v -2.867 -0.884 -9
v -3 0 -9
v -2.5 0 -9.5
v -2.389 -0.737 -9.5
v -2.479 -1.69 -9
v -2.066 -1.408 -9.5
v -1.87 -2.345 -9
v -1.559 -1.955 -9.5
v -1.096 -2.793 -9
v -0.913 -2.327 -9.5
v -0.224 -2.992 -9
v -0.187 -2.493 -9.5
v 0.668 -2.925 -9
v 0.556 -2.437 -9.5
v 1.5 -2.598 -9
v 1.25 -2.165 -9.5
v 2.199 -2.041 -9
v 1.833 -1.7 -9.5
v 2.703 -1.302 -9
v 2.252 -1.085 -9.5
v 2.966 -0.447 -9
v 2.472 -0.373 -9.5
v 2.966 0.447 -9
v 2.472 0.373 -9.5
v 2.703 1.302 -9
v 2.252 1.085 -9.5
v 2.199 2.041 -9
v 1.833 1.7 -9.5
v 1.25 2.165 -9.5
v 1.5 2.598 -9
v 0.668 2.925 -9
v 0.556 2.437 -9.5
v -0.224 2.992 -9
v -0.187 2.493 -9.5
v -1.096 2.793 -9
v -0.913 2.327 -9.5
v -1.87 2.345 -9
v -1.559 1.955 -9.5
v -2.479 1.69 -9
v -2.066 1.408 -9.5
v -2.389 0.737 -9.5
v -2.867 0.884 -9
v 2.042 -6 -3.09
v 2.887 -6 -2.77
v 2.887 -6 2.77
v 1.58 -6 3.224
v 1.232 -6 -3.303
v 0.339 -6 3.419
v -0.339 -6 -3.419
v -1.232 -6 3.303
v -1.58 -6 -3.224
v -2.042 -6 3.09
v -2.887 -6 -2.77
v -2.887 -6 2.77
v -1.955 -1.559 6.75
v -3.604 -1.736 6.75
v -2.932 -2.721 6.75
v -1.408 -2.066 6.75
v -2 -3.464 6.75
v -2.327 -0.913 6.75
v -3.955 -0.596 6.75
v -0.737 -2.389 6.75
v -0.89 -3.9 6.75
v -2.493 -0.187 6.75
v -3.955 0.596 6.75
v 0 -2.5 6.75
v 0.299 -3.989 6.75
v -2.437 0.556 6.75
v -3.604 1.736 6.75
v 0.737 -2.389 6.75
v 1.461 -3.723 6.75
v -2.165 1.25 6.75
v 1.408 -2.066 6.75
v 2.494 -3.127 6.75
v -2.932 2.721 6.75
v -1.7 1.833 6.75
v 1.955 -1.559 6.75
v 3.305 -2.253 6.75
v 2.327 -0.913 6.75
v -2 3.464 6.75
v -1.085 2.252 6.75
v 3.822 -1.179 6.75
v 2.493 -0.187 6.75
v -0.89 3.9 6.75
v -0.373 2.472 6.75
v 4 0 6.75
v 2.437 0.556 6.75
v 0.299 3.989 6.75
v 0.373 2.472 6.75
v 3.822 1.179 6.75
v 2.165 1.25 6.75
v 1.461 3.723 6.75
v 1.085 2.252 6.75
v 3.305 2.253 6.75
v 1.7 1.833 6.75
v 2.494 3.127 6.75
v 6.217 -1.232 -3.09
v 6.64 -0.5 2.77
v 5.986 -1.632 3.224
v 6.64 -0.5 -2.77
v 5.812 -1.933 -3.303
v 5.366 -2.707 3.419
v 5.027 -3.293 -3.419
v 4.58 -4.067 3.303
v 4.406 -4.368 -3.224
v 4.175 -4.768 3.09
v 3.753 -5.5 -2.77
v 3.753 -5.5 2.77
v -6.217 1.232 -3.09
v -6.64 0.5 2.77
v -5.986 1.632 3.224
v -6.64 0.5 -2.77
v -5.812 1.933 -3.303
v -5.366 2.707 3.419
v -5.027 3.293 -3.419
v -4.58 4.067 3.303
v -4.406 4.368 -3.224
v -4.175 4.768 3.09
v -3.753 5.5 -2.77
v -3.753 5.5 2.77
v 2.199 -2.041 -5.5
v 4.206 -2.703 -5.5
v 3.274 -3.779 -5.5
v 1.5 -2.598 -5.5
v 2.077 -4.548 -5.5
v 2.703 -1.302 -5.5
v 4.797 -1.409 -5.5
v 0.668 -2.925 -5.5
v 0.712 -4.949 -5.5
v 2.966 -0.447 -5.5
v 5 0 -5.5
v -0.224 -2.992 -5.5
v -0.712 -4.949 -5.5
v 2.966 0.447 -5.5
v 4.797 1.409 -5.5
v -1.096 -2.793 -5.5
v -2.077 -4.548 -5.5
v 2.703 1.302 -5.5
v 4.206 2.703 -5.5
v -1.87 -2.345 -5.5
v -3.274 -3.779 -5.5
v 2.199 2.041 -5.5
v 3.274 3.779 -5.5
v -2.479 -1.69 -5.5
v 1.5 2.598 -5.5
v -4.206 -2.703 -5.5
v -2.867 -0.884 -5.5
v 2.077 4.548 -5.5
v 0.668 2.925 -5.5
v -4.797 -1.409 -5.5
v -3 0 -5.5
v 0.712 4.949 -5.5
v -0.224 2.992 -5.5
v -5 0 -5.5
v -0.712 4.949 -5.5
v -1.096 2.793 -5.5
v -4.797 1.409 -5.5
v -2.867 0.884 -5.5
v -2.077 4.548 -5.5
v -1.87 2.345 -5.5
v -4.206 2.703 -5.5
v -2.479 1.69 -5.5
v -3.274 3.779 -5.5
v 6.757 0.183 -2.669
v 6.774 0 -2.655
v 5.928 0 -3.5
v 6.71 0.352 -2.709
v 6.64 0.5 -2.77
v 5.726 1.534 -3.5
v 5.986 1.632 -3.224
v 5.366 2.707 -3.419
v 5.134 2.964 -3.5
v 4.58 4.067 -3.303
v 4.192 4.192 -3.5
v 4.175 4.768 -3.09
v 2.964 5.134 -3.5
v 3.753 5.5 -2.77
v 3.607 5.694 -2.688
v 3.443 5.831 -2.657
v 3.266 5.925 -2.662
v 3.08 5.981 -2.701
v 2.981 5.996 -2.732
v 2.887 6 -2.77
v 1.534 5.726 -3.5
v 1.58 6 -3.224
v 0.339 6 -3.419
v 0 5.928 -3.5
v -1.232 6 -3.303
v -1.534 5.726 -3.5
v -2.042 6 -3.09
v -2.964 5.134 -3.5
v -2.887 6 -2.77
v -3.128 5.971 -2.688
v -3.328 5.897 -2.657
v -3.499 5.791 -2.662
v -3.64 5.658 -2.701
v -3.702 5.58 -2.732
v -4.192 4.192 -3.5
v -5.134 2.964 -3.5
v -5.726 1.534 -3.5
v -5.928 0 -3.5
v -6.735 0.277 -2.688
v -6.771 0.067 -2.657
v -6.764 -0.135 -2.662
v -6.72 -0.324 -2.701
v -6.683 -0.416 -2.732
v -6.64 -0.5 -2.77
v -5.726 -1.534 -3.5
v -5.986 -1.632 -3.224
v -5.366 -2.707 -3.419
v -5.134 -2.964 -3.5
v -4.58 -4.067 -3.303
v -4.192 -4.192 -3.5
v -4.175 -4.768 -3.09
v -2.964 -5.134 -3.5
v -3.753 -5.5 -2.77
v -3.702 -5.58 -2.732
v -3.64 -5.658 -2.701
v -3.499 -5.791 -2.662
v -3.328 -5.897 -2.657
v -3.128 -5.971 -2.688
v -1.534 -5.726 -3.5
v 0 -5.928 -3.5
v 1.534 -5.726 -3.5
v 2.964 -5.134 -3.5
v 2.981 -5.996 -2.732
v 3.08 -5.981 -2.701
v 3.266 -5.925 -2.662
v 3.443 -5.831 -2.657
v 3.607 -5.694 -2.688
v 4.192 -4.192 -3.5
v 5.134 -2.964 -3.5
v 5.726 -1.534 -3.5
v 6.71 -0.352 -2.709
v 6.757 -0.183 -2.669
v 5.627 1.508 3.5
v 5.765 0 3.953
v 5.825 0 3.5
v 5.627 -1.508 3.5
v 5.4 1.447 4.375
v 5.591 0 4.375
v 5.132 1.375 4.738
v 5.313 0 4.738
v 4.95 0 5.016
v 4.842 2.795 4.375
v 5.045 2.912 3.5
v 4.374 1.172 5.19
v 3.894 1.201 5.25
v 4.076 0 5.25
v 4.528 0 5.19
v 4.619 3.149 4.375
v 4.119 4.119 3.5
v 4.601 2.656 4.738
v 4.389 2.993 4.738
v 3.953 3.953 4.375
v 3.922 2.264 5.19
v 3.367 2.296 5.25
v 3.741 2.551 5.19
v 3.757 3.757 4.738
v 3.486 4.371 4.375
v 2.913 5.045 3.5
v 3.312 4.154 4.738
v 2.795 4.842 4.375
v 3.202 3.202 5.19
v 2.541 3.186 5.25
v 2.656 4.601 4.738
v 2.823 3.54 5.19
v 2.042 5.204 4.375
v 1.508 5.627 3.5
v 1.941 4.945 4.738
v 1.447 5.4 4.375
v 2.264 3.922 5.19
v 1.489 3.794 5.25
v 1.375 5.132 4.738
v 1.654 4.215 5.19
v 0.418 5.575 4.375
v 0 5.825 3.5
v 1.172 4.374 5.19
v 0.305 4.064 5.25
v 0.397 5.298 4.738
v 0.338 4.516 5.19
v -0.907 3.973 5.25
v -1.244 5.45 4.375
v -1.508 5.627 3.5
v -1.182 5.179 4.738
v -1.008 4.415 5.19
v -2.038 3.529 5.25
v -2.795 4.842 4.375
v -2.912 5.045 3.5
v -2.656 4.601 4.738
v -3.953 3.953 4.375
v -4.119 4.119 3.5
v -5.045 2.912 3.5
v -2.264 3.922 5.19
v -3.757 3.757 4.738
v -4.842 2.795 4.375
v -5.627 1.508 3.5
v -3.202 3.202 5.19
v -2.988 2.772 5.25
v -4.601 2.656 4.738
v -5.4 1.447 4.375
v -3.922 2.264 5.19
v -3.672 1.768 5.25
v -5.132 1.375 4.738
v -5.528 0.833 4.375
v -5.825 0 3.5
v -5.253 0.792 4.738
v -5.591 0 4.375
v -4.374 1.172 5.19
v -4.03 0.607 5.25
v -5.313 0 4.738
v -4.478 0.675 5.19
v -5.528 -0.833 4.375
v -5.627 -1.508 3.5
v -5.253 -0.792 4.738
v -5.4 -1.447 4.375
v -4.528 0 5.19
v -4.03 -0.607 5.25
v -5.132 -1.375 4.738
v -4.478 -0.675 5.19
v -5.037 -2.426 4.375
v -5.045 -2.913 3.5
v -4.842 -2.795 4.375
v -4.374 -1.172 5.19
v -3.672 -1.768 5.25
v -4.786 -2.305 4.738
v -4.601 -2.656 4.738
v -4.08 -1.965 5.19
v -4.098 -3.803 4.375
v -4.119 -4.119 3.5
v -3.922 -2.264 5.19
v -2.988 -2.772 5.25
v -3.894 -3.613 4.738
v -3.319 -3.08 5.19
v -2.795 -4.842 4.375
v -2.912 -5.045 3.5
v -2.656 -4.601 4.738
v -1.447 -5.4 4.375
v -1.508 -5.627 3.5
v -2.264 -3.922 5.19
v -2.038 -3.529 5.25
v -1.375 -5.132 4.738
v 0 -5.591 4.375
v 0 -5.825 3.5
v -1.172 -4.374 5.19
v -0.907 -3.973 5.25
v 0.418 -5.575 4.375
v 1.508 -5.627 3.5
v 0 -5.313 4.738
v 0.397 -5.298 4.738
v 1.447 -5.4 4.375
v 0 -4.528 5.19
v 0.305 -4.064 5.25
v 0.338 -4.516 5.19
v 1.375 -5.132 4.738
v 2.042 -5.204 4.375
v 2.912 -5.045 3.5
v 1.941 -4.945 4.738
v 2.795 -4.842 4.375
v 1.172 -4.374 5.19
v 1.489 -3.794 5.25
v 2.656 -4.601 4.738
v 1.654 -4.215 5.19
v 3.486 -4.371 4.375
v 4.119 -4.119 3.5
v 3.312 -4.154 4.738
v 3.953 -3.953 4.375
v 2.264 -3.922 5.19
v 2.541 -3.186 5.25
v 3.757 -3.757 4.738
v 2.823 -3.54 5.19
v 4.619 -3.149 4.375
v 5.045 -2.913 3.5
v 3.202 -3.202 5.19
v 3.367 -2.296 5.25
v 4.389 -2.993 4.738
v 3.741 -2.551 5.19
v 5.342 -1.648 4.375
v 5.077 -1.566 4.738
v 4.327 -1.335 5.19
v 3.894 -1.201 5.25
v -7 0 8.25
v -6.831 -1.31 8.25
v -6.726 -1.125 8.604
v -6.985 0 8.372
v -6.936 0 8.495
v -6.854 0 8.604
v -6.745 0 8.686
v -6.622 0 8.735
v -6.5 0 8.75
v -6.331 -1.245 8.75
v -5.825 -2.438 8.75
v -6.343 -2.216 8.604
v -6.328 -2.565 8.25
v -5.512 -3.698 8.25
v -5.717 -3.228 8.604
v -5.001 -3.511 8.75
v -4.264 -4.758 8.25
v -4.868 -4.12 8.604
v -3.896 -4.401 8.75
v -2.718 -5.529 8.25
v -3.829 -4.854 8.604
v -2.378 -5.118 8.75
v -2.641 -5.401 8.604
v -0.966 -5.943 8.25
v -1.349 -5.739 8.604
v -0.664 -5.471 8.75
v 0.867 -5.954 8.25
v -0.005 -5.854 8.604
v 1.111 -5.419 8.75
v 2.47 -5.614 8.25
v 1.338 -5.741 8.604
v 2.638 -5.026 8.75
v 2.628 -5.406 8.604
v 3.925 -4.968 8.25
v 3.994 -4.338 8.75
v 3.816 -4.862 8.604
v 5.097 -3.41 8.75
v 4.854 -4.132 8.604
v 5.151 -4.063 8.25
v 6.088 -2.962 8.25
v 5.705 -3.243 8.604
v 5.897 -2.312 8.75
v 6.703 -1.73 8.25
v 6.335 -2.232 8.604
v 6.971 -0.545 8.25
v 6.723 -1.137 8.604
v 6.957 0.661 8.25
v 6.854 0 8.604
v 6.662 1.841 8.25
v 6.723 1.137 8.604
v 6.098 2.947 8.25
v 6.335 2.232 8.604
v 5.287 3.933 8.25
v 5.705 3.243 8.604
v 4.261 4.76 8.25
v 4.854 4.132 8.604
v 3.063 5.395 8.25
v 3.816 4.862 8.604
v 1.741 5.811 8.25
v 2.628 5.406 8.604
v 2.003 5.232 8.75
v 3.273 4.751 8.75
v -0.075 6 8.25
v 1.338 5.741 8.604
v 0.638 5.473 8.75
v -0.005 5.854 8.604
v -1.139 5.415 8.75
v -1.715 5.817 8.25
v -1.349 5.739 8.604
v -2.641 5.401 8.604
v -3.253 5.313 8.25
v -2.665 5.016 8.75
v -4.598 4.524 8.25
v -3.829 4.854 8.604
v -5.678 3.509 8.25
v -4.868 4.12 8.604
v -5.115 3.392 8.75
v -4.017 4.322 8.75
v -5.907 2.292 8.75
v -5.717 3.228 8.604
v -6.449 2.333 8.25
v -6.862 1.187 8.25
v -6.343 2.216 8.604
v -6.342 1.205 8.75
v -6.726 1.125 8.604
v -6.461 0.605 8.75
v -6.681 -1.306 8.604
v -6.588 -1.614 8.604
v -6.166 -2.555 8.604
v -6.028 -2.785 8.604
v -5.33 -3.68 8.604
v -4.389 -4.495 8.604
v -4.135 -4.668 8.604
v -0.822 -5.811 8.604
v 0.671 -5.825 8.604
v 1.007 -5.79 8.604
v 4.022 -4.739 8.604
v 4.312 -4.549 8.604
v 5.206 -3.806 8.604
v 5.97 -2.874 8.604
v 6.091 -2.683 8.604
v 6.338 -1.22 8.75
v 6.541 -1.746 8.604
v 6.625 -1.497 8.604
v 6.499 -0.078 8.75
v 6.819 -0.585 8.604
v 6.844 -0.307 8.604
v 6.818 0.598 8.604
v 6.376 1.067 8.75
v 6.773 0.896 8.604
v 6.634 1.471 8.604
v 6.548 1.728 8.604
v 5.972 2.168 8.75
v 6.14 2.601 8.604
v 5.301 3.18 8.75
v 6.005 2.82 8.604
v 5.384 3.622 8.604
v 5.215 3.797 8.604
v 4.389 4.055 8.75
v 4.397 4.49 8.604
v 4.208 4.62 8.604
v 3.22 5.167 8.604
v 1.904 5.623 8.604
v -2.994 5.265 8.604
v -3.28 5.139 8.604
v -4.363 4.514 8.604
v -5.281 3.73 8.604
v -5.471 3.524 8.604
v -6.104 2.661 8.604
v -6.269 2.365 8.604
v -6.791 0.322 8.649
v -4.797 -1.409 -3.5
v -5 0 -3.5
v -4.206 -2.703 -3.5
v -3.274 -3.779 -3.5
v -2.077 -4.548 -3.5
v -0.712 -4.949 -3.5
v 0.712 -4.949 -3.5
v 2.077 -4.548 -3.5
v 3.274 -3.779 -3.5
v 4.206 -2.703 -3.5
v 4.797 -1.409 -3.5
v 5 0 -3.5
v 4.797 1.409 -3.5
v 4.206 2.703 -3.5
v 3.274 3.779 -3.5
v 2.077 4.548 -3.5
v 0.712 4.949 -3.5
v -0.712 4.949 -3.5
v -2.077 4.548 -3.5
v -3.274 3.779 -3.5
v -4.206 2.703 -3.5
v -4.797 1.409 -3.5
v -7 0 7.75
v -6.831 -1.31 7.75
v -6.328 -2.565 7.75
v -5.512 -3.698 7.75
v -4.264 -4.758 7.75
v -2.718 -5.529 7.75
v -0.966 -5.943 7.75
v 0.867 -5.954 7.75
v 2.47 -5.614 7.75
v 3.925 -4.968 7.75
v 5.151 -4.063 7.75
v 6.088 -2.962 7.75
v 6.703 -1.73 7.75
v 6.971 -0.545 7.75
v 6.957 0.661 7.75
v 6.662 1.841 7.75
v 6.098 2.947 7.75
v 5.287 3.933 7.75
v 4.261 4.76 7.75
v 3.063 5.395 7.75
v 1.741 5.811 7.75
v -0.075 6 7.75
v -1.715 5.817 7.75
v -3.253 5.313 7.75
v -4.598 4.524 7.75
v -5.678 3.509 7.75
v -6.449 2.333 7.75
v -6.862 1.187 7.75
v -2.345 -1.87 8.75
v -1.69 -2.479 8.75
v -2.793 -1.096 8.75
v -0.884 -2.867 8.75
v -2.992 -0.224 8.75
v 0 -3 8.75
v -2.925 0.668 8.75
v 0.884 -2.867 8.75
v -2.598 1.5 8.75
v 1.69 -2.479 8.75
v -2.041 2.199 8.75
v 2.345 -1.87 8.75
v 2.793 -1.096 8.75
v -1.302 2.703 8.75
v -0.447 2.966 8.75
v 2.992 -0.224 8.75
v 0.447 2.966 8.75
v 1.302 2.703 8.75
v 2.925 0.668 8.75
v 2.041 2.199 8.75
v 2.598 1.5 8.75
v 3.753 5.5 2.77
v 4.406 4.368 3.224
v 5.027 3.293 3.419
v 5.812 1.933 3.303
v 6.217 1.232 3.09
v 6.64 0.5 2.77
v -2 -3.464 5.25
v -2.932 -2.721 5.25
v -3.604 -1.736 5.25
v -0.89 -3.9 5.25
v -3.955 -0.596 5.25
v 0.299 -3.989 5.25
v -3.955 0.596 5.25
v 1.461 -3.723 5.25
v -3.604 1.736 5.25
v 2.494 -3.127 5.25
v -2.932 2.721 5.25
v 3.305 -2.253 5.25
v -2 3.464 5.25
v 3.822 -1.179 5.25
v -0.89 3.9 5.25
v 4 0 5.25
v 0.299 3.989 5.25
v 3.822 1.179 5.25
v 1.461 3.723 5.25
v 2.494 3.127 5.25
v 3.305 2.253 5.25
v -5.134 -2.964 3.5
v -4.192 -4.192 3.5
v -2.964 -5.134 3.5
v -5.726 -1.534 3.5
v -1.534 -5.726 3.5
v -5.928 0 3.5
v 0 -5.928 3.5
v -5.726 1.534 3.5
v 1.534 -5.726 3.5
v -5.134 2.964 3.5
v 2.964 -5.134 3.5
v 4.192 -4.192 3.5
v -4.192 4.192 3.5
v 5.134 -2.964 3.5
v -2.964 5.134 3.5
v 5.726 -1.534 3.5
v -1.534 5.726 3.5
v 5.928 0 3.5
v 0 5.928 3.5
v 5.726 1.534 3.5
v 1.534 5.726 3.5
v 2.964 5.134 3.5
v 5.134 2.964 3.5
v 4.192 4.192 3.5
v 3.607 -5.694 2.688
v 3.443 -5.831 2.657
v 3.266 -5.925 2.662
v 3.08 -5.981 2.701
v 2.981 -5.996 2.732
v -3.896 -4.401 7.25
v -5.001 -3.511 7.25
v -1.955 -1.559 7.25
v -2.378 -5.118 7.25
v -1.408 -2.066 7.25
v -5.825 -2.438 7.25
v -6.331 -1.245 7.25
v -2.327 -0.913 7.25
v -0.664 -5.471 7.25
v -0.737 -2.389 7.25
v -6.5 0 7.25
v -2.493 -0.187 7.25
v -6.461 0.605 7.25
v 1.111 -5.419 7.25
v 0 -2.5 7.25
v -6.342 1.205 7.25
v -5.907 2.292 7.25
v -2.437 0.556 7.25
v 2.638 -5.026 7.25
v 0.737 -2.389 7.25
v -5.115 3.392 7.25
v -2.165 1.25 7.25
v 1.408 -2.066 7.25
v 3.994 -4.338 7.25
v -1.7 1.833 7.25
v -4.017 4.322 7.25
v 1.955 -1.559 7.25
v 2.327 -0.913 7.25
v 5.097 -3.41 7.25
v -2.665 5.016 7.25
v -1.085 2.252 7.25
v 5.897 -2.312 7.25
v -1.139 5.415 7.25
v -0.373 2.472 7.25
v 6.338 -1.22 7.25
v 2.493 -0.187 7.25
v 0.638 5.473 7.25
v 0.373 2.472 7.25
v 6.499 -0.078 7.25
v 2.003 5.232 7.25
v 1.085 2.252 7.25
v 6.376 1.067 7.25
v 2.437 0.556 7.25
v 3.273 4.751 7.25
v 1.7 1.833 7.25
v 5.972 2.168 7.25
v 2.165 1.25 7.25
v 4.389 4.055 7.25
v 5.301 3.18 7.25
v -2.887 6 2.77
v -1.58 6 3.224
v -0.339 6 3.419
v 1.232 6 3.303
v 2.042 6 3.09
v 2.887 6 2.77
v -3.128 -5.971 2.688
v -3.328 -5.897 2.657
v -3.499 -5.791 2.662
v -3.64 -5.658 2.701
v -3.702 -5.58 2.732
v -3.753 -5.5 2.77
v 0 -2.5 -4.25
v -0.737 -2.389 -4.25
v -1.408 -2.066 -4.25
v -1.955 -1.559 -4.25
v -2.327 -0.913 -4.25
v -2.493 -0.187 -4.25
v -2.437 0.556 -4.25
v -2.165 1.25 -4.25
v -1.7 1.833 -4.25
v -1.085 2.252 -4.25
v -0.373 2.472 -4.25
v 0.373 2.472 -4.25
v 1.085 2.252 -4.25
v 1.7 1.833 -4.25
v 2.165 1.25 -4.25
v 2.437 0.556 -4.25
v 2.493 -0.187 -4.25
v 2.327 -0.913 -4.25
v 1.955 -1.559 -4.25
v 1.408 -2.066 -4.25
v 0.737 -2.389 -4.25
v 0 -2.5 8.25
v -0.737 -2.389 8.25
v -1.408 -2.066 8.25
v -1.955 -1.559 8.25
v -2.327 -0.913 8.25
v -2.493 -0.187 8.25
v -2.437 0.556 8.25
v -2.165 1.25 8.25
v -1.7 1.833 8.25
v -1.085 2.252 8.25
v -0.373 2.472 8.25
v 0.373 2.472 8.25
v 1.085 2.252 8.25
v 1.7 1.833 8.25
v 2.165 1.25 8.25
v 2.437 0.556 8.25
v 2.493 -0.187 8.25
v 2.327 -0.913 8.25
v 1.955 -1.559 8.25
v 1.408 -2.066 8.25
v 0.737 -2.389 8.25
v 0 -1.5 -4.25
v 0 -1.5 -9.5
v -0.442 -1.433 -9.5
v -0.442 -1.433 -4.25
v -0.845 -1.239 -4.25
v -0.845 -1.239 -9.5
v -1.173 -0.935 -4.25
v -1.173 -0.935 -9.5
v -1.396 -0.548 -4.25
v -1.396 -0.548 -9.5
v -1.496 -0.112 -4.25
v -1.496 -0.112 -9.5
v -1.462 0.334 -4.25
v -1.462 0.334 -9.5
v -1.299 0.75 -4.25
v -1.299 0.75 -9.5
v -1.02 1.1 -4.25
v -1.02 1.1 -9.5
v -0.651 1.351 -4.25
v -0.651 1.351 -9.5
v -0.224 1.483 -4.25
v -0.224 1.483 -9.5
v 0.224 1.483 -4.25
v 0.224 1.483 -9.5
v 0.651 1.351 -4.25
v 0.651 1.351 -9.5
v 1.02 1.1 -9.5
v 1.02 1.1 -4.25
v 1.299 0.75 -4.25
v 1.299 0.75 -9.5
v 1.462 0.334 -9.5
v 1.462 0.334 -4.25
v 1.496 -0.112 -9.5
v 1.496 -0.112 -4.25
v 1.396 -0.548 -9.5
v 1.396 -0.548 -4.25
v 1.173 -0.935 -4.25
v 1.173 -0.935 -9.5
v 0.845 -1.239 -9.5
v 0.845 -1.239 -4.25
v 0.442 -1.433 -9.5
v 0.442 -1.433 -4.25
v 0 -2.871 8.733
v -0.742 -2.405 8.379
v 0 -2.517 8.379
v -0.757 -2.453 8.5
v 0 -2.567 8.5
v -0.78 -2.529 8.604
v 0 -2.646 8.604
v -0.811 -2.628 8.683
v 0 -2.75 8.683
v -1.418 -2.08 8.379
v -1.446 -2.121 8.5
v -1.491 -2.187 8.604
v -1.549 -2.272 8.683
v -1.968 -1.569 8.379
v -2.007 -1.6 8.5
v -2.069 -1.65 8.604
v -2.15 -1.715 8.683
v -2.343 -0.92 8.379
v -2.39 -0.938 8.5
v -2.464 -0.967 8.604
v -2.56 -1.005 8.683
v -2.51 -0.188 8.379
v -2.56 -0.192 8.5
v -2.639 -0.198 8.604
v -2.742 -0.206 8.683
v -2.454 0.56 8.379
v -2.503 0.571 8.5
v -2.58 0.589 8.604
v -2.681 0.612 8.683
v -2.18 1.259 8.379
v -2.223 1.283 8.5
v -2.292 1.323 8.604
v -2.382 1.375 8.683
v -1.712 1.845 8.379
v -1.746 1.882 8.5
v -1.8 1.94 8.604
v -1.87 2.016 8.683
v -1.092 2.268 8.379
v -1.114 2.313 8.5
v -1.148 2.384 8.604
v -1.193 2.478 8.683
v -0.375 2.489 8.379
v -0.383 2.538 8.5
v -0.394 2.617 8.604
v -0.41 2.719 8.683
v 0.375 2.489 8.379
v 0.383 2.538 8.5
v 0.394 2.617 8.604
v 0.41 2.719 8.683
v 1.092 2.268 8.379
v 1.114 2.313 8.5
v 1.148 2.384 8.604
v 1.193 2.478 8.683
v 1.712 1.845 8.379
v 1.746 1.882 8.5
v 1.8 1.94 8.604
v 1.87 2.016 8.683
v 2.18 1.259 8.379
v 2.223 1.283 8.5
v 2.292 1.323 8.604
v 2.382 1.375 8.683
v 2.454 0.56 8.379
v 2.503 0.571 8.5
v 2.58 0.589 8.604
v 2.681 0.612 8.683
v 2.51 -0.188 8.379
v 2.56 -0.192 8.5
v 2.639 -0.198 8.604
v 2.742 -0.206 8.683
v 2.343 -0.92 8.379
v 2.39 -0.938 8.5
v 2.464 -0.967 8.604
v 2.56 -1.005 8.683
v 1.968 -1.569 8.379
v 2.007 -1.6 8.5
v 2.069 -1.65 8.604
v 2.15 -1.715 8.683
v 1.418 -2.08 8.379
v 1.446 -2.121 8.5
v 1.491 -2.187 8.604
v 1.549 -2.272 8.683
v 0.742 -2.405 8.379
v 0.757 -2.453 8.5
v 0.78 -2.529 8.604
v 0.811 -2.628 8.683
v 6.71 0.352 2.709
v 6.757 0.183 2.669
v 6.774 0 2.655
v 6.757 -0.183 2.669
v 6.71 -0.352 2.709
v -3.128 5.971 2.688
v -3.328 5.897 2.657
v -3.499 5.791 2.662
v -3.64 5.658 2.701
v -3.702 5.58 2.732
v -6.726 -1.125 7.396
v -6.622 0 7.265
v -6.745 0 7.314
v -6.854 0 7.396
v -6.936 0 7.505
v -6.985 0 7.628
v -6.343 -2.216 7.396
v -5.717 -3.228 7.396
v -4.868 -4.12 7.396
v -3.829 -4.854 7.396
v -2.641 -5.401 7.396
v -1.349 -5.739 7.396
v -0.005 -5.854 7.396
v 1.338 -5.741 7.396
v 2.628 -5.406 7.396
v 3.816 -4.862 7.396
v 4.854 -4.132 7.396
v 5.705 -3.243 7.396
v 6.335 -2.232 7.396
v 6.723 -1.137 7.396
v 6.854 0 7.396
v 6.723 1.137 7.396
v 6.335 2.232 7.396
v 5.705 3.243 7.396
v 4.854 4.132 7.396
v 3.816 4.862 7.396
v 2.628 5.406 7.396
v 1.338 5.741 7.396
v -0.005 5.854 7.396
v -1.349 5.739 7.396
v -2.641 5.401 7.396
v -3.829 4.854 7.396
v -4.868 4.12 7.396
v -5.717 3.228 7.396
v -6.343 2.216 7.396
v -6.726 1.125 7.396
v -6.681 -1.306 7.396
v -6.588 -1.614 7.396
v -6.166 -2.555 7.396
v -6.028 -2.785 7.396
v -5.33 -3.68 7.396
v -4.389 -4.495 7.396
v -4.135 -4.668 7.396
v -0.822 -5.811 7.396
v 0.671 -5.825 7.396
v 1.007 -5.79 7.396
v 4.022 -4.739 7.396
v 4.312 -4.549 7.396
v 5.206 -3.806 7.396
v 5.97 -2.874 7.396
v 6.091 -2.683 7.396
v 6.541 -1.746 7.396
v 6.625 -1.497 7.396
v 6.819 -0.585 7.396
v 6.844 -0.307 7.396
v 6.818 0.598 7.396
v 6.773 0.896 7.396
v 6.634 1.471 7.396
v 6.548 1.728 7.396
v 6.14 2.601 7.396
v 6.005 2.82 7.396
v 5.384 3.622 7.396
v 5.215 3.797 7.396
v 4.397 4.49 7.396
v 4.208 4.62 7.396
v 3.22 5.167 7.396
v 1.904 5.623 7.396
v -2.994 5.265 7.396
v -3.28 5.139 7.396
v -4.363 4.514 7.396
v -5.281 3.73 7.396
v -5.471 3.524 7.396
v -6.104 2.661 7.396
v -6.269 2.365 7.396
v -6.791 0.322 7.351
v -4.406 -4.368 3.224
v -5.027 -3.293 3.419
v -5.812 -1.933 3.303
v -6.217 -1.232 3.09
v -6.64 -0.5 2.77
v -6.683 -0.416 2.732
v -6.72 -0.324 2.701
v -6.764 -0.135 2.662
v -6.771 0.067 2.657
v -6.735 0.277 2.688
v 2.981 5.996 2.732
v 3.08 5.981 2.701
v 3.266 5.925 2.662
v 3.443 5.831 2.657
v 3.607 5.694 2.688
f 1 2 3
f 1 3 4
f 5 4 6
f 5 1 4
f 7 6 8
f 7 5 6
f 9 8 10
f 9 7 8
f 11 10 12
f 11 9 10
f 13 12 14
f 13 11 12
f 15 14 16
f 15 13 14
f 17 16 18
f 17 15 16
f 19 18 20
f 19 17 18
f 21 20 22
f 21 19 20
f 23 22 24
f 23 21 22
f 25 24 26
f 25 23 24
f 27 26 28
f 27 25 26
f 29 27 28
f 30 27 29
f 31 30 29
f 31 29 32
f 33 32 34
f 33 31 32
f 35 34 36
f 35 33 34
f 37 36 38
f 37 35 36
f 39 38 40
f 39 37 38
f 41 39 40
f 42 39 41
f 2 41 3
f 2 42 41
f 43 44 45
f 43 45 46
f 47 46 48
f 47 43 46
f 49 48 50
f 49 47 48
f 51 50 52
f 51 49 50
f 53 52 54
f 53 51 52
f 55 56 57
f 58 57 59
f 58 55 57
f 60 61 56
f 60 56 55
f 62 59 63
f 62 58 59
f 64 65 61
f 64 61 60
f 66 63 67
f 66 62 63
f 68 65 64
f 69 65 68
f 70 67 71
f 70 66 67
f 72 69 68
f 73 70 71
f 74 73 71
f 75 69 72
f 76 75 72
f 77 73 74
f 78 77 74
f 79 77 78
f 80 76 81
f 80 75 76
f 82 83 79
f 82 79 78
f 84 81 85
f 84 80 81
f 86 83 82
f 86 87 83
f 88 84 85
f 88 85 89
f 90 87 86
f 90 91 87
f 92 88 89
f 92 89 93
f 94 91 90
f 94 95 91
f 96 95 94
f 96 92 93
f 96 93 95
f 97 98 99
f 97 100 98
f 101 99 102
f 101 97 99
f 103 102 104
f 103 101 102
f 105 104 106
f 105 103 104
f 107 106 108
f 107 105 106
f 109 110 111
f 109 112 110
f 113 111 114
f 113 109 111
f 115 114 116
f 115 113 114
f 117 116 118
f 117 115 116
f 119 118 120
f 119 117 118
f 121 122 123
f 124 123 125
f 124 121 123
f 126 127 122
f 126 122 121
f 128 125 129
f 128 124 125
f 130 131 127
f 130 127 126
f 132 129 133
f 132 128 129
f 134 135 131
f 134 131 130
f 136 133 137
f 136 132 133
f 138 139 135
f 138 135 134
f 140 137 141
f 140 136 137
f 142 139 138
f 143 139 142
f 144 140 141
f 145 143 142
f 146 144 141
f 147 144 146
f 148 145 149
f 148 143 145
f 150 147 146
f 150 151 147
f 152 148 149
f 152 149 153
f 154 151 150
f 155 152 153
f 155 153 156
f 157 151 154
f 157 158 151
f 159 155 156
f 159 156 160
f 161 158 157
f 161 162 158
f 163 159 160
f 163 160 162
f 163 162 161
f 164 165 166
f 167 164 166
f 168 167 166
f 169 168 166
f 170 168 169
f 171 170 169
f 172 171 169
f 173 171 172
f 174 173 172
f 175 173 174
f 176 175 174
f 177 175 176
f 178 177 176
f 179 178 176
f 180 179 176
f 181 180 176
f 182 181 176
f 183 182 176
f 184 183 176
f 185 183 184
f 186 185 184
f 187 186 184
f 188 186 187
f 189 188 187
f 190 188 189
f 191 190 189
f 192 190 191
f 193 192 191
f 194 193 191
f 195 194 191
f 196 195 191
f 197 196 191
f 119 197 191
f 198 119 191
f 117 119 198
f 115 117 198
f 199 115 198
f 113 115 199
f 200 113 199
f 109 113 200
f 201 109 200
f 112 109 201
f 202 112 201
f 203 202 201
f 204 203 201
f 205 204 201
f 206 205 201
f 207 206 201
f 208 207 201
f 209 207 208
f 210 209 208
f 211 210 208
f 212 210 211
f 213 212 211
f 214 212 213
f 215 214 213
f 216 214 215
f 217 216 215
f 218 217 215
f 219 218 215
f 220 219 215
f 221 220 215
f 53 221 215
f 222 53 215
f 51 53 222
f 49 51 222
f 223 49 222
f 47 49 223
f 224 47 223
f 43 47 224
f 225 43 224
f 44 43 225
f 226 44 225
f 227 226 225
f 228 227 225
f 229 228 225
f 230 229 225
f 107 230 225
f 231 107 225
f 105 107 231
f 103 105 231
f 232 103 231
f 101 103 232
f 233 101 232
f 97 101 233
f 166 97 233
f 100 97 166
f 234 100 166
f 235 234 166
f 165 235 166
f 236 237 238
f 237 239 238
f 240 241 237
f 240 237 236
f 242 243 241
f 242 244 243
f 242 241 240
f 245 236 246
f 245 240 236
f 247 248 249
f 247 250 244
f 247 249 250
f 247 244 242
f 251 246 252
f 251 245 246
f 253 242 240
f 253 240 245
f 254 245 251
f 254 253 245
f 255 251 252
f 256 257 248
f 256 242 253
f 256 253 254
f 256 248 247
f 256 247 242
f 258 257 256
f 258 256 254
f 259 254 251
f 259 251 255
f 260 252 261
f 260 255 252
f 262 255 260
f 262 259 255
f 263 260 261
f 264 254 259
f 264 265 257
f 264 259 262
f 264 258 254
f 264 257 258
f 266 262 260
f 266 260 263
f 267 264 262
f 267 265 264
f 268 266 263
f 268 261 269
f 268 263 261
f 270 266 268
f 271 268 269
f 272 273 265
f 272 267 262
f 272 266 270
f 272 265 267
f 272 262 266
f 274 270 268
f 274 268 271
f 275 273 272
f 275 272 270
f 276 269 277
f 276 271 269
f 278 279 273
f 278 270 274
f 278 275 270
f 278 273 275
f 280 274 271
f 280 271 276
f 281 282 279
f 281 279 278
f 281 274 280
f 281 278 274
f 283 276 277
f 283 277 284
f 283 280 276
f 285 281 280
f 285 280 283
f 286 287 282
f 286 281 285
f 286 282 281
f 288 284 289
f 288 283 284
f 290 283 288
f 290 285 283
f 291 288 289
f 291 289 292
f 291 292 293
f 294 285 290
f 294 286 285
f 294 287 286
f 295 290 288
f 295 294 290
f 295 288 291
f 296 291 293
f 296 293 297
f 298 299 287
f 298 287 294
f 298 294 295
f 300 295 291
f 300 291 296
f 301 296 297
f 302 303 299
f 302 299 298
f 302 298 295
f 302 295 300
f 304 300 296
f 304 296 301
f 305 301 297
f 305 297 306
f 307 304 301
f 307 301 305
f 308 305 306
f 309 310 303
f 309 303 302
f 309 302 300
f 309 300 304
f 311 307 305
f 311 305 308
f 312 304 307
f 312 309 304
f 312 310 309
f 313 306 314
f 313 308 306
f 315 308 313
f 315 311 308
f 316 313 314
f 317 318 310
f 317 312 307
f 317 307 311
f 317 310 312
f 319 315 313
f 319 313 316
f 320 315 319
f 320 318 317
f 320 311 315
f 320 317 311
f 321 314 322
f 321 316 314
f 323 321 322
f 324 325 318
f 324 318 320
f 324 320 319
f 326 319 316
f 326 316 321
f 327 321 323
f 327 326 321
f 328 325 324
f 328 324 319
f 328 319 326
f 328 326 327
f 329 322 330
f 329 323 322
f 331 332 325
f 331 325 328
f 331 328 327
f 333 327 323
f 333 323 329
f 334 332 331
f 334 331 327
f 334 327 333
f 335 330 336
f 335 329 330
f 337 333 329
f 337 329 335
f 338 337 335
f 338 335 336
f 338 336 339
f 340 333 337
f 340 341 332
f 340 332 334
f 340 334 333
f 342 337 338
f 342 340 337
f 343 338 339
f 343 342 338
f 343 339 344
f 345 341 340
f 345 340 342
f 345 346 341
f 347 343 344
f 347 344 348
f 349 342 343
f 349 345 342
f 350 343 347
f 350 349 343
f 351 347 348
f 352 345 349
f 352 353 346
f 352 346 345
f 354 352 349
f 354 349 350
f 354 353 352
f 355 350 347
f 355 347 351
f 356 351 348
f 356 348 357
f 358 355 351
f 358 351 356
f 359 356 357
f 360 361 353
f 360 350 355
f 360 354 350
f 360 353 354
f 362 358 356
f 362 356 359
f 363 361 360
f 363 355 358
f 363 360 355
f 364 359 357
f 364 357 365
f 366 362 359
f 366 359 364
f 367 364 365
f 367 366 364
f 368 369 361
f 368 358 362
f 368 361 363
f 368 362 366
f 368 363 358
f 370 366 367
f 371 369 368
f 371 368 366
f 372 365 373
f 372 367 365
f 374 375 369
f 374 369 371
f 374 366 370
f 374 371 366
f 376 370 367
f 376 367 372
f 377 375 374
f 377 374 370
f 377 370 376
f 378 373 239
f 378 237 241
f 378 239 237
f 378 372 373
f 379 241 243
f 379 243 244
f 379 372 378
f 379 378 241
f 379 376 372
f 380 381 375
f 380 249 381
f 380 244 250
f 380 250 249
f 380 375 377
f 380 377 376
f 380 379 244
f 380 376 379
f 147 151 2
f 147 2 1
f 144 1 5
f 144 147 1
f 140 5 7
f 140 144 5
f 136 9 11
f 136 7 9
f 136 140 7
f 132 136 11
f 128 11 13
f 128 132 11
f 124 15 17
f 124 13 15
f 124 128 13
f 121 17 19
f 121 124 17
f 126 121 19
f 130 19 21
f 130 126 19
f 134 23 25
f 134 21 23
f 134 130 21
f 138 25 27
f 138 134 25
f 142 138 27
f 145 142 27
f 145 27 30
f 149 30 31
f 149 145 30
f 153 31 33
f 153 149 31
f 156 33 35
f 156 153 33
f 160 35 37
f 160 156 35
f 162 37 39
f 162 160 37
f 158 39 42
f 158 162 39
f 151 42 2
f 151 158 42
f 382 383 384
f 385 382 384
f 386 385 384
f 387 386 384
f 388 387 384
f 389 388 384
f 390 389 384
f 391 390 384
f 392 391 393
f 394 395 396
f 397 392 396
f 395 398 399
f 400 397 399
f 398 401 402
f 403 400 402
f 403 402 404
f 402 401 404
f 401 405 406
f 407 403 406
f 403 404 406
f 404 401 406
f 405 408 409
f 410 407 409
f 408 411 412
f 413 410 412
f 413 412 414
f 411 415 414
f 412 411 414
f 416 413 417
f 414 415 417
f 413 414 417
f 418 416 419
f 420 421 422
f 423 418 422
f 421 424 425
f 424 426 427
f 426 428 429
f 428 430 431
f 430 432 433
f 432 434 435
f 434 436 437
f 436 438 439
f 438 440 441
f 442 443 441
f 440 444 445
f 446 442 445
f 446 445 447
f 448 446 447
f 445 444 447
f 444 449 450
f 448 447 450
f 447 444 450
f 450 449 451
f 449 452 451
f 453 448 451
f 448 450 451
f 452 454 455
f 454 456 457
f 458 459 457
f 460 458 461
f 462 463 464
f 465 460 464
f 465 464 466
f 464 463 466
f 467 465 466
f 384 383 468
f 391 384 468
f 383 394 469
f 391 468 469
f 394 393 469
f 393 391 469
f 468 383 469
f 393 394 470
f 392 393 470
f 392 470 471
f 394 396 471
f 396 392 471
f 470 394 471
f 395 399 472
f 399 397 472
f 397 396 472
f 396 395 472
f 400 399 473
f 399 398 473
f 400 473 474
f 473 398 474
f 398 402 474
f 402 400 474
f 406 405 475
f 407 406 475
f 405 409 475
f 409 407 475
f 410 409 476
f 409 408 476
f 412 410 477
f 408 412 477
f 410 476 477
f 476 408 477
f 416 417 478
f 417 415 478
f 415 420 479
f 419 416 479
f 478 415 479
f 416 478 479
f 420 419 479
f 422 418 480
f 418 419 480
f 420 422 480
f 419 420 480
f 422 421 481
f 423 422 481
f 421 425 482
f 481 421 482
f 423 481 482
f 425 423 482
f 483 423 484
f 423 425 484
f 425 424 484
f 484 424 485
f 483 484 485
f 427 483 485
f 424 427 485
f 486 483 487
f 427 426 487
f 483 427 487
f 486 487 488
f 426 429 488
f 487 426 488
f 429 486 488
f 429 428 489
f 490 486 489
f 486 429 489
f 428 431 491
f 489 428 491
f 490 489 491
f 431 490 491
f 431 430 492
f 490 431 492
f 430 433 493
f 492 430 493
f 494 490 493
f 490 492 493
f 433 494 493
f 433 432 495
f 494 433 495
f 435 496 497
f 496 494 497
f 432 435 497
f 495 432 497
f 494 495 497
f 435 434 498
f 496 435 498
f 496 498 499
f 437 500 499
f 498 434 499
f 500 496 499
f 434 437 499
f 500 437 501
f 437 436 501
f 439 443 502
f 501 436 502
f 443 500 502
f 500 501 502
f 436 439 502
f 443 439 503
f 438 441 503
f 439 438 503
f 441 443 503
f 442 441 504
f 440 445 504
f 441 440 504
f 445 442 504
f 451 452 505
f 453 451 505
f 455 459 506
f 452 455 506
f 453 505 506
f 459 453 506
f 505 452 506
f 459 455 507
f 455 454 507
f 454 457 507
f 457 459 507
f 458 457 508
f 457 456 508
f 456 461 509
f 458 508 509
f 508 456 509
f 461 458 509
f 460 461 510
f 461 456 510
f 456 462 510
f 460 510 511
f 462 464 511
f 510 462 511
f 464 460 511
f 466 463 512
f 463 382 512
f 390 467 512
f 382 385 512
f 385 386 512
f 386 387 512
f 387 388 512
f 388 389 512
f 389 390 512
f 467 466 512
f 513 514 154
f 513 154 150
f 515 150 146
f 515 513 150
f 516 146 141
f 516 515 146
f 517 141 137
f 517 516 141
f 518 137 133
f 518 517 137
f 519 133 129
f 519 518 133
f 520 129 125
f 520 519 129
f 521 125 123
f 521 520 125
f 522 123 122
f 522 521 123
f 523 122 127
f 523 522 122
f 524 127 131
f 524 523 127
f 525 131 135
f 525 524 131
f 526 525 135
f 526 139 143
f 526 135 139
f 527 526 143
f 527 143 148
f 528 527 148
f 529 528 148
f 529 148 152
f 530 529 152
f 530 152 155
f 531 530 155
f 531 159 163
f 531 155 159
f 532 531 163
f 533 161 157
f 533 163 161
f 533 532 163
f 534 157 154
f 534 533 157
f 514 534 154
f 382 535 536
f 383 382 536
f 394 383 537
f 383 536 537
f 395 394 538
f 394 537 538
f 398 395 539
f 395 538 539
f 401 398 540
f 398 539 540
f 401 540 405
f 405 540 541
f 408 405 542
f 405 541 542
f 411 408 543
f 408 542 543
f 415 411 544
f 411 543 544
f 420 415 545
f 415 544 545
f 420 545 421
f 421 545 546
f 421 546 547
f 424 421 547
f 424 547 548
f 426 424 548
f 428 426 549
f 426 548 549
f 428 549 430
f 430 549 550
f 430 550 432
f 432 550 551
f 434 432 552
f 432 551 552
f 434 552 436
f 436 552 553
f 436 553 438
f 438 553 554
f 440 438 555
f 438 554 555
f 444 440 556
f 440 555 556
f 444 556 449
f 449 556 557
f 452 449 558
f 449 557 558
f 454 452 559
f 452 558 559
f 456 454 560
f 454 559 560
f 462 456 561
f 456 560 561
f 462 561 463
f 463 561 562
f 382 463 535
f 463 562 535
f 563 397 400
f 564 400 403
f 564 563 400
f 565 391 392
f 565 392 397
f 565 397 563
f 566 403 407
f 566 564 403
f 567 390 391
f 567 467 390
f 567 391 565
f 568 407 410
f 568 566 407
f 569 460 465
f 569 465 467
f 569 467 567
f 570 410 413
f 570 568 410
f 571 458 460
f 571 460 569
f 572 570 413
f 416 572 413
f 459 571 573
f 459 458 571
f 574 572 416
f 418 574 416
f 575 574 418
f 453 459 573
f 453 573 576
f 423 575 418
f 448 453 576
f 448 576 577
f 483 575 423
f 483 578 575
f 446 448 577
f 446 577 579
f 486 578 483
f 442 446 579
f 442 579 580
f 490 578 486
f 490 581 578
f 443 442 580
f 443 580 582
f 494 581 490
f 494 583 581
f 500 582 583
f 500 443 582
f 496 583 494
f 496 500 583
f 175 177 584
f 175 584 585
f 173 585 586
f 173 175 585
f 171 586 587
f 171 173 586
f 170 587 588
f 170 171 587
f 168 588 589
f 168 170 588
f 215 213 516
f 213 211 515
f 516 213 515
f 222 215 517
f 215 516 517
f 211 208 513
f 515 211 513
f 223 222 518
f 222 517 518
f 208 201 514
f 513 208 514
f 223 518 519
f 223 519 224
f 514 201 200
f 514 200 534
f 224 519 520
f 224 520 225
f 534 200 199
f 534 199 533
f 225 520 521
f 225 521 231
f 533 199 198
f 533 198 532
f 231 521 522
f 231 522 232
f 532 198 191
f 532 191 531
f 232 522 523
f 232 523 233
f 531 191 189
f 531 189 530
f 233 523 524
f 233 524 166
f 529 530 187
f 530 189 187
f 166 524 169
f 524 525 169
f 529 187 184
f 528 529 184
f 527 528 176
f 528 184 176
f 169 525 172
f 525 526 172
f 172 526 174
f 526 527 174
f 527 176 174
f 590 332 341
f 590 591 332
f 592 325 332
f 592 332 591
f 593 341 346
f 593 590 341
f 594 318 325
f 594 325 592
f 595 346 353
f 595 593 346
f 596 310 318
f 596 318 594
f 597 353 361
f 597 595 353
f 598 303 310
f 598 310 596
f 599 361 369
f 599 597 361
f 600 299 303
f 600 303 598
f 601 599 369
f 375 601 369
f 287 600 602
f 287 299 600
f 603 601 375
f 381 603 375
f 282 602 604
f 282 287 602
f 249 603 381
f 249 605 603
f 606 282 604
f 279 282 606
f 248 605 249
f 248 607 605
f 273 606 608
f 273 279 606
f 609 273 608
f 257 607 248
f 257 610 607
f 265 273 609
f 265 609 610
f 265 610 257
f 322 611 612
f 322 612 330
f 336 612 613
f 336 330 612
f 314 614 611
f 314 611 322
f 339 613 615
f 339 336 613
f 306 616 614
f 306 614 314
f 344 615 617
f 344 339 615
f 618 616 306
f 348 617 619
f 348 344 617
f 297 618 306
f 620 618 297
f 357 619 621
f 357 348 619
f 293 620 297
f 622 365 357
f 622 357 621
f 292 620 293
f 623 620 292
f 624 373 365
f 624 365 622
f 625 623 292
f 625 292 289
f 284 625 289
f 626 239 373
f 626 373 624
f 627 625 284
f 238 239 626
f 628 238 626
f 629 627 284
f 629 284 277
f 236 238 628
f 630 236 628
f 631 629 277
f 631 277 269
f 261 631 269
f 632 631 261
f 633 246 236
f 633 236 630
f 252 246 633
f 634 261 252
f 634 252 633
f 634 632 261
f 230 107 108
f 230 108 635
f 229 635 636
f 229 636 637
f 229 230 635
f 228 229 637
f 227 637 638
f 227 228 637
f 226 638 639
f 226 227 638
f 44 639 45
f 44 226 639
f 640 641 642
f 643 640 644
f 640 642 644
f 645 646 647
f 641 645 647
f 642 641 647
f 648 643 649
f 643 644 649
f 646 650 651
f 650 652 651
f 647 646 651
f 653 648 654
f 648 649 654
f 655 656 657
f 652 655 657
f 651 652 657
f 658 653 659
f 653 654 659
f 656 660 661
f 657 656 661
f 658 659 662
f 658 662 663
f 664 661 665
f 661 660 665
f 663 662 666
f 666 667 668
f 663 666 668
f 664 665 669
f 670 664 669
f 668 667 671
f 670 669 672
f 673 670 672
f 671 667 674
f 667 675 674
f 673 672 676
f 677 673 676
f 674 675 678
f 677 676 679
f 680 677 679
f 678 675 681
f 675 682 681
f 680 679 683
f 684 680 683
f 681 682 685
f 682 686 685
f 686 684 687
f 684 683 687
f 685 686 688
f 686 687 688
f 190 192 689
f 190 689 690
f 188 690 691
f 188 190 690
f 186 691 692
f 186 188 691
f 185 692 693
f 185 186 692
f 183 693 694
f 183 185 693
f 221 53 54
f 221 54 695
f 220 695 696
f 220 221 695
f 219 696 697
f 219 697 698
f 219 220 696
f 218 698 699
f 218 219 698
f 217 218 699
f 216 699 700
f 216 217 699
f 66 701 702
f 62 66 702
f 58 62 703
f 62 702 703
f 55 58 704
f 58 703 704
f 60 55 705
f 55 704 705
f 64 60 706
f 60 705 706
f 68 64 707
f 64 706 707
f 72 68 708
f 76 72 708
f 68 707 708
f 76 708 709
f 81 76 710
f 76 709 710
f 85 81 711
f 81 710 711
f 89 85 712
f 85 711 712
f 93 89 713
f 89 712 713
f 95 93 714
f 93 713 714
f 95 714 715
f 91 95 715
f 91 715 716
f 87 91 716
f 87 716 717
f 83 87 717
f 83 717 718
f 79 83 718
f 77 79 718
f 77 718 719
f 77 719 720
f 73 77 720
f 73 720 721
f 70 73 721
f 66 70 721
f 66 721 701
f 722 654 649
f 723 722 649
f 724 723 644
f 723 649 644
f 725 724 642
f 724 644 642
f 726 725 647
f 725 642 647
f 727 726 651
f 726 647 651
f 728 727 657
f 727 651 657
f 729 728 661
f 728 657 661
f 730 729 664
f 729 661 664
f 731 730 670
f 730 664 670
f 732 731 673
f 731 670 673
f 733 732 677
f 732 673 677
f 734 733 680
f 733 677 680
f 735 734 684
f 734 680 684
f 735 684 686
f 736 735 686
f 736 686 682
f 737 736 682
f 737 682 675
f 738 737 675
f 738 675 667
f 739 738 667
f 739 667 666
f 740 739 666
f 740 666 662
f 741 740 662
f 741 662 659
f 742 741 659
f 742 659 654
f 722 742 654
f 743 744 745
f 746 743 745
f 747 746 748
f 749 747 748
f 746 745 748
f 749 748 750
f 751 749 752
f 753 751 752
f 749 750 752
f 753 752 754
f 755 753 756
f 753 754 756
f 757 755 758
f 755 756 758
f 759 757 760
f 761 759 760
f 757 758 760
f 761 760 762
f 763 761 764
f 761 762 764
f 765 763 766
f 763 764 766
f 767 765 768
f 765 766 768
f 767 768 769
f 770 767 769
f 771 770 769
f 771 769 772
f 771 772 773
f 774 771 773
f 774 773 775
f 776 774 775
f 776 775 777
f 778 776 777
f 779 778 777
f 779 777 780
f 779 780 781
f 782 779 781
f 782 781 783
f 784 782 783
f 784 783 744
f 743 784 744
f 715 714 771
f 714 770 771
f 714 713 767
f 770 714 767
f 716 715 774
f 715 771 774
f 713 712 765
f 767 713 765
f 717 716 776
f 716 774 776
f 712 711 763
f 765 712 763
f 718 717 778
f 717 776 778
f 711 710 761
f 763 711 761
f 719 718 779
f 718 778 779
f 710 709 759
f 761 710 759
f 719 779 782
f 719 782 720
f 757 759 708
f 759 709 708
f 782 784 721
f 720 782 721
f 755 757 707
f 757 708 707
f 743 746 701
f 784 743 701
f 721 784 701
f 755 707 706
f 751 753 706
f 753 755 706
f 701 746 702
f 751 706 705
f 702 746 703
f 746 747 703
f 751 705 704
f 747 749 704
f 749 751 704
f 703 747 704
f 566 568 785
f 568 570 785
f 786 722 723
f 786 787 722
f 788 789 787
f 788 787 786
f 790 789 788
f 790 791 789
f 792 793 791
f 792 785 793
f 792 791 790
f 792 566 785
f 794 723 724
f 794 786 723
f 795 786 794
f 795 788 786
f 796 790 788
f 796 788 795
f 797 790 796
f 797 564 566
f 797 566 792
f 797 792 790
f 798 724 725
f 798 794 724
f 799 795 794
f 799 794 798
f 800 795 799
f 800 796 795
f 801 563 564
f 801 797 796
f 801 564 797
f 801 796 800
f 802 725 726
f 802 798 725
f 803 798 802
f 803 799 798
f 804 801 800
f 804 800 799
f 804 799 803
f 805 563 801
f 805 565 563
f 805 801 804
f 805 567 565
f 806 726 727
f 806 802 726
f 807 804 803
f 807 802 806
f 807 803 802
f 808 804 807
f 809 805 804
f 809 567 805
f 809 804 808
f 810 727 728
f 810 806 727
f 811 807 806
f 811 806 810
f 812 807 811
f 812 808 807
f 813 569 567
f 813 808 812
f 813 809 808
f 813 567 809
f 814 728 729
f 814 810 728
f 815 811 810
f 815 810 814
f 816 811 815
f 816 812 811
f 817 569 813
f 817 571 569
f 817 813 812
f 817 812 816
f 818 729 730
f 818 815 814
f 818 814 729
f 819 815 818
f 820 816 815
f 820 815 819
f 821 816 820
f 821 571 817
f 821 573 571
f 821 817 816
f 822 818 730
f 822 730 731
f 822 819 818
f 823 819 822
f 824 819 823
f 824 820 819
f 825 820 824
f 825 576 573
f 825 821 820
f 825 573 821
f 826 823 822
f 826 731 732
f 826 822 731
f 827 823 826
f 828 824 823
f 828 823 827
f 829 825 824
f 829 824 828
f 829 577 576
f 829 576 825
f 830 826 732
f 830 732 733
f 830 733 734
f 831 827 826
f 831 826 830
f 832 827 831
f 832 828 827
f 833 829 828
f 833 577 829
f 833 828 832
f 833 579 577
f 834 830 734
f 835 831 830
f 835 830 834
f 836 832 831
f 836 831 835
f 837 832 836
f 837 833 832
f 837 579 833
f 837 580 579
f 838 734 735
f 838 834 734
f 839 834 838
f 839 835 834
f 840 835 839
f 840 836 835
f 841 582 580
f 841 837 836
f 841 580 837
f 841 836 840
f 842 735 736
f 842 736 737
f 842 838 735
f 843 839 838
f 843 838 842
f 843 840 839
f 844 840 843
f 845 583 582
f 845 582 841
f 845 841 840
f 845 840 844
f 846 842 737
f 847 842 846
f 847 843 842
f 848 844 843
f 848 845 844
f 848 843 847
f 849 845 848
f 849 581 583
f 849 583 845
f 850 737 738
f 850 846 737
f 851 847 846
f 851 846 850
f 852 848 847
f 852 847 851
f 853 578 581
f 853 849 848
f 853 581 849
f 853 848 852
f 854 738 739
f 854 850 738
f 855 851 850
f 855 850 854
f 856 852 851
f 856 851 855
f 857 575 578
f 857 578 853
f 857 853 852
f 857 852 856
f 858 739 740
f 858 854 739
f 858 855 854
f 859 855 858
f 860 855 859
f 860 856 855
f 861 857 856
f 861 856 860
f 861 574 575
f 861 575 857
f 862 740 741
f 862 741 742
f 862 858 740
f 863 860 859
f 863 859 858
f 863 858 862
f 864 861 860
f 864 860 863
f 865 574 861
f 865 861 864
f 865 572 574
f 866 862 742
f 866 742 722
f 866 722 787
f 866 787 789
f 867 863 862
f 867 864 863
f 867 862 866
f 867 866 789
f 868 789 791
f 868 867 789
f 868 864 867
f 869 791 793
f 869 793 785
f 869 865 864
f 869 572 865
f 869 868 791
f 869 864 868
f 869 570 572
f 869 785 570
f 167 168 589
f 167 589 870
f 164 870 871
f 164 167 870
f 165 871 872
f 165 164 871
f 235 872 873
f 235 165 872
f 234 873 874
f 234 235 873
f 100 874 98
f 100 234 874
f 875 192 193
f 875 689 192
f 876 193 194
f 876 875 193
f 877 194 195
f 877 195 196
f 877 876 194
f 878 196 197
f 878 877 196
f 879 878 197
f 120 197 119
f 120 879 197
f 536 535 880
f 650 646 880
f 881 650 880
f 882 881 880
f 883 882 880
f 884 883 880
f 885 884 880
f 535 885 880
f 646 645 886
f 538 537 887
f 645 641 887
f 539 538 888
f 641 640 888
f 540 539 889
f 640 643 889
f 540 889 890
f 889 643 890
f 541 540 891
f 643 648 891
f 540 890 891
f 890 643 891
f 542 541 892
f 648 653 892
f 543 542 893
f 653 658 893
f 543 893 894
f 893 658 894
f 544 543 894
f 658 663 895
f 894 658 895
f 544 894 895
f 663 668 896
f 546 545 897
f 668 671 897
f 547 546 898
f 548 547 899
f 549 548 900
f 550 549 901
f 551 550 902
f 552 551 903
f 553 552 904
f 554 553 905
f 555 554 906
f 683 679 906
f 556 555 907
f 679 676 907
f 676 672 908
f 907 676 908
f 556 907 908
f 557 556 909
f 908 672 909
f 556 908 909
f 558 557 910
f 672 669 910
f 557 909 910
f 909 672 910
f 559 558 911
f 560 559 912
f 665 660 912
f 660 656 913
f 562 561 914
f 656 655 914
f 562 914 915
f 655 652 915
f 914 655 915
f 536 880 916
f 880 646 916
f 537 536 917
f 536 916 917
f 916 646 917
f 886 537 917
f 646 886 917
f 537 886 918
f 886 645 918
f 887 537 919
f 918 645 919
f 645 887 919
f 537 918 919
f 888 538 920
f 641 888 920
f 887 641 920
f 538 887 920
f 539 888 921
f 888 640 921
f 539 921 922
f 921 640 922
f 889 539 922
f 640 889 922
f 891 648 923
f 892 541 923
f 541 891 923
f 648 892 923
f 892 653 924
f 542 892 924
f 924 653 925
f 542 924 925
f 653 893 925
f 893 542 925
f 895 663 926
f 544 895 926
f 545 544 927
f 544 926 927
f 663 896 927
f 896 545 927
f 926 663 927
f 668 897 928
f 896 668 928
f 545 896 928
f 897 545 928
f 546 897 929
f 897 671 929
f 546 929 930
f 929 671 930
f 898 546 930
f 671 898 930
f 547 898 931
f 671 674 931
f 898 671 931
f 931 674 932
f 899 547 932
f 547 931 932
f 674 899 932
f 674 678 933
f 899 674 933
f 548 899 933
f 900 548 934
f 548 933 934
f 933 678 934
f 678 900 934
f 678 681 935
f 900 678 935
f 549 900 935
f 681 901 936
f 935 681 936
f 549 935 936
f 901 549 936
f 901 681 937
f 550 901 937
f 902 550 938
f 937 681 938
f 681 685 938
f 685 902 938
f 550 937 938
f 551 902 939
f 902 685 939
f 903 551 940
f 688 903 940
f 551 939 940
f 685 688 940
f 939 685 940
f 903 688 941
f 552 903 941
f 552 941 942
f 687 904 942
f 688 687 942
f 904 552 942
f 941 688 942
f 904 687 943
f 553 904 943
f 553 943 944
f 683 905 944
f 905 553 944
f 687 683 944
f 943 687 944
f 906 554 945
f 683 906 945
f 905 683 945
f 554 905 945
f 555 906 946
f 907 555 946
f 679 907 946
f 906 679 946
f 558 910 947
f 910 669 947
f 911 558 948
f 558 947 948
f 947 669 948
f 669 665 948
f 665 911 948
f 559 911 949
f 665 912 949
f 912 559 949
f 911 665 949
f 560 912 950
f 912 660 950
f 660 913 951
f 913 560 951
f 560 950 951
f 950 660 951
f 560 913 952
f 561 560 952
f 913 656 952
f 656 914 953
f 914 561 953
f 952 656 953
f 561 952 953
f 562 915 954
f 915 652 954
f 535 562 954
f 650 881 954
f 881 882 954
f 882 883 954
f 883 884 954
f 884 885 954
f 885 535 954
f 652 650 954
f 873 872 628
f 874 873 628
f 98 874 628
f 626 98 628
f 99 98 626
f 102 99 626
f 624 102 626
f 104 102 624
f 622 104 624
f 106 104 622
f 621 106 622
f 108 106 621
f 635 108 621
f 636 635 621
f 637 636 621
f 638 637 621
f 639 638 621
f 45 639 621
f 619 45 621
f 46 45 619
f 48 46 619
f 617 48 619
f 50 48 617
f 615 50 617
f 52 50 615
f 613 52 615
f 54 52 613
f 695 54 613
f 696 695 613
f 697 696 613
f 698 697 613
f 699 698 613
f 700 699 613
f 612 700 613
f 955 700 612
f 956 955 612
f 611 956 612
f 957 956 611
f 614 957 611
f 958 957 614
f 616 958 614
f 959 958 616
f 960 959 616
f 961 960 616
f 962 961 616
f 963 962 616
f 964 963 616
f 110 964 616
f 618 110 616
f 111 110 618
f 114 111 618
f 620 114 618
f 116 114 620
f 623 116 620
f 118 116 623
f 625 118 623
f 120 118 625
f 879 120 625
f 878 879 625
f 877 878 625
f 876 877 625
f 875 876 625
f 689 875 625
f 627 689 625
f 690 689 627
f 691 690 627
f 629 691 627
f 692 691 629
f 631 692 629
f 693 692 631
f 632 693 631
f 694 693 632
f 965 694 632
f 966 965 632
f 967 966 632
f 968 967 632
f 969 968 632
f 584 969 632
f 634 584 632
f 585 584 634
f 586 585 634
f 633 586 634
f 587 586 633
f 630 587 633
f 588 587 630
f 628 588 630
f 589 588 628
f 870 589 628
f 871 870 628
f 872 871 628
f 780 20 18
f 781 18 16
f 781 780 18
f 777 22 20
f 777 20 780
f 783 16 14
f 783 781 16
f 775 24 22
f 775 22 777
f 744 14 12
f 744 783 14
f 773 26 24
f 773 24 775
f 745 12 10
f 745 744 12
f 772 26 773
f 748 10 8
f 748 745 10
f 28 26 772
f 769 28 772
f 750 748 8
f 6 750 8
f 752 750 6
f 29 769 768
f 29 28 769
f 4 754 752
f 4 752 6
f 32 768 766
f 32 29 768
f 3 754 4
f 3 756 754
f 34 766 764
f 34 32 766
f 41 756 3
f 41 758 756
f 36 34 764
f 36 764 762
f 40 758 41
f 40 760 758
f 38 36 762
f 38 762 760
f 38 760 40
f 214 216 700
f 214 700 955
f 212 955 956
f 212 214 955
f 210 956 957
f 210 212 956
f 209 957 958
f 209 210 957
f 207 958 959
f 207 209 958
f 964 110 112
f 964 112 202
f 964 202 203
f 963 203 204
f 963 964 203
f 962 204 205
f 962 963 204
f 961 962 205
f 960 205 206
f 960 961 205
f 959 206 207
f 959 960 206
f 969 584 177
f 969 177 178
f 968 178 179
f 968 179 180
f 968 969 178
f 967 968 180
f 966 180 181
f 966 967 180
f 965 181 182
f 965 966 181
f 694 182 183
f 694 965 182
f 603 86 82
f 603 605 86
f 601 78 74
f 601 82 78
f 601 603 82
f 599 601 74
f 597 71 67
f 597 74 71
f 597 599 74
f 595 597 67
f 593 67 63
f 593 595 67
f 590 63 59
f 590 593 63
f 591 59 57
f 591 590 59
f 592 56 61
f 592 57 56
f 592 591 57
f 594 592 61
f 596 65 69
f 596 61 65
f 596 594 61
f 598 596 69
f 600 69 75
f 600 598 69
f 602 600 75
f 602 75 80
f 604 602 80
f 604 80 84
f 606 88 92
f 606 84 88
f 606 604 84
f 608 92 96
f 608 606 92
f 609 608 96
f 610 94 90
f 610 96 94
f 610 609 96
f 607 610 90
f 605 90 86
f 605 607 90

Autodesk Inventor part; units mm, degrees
ref_plane "YZ Plane" through (0, 0, 0) normal (1, 0, 0) x (0, 1, 0)
ref_plane "XZ Plane" through (0, 0, 0) normal (0, 1, 0) x (-1, 0, 0)
sketch "Esquisse1" plane through (0, 0, 0) normal (0, 0, 1) x (1, 0, 0)
  line L0 (3.4641, 6) -> (6.9282, 0)
  line L1 (6.9282, 0) -> (3.4641, -6)
  line L2 (3.4641, -6) -> (-3.4641, -6)
  line L3 (-3.4641, -6) -> (-6.9282, 0)
  line L4 (-6.9282, 0) -> (-3.4641, 6)
  line L5 (-3.4641, 6) -> (3.4641, 6)
  point P0 (0, 0)
  point P1 (0, 0)
  dimension "d0" = 12
extrude "Extrusion1" add sketch "Esquisse1" along normal mid plane 7
fillet "Congé2" radius 1 6 edges at (-6.9282, 0, 0) (-3.4641, -6, 0) (3.4641, -6, 0) (6.9282, 0, 0) (3.4641, 6, 0) (-3.4641, 6, 0)
sketch "Esquisse5" plane through (0, 0, 0) normal (0, 1, 0) x (-1, 0, 0)
  line L0 (-6.9282, 3.5) -> (-3.4641, 3.5) projected
  line L1 (-5.9282, 3.5) -> (-6.9282, 2.5)
  line L2 (-6.9282, 2.5) -> (-6.9282, -2.5)
  line L3 (-6.9282, -2.5) -> (-5.9282, -3.5)
  line L4 (-3.4641, -3.5) -> (-6.9282, -3.5) projected
  line L5 (-5.9282, -4.5) -> (-5.9282, -3.5)
  line L6 (-5.9282, -4.5) -> (-7.9282, -4.5)
  line L7 (-7.9282, -4.5) -> (-7.9282, 4.5)
  line L8 (-7.9282, 4.5) -> (-5.9282, 4.5)
  line L9 (-5.9282, 4.5) -> (-5.9282, 3.5)
  line L10 (-6.6395, 3.5) -> (-3.7528, 3.5) construction
  line L11 (-3.7528, -3.5) -> (-6.6395, -3.5) construction
  line L12 (0, -6.3) -> (0, 6.3) projected
  line L13 (-3.7528, 3.5) -> (-3.7528, -3.5) projected
  line L14 (-6.6395, -3.5) -> (-6.6395, 3.5) projected
  point P0 (0, 0)
  dimension "d13" = 45
  dimension "d14" = 1
  dimension "d15" = 1
  dimension "d16" = 1
  dimension "d17" = 1
revolve "Révolution1" cut sketch "Esquisse5" angle 360 about axis through (0, 0, -10) along (0, 0, 1) contours L14 L1 L2 L3 L4 L5 L6 L7 L8 L9 L0 | L0 L1 L14 | L3 L4 L14
sketch "Esquisse2" plane through (0, 0, -3.5) normal (0, 0, -1) x (-1, 0, 0)
  circle A0 centre (0, 0) radius 5
  dimension "d3" = 10
extrude "Extrusion2" add sketch "Esquisse2" along normal blind 2
sketch "Esquisse3" plane through (0, 0, -5.5) normal (0, 0, -1) x (-1, 0, 0)
  circle A0 centre (0, 0) radius 3
  dimension "d6" = 6
extrude "Extrusion3" add sketch "Esquisse3" along normal blind 4
chamfer "Chanfrein1" distance 0.5 angle 45 1 edges at (3, 0, -9.5)
sketch "Esquisse4" plane through (0, 0, 3.5) normal (0, 0, 1) x (1, 0, 0)
  circle A0 centre (0, 0) radius 5.825
  dimension "d9" = 11.65
extrude "Extrusion4" add sketch "Esquisse4" along normal blind 1.75
fillet "Congé1" radius 1.75 1 edges at (-5.825, 0, 5.25)
sketch "Esquisse6" plane through (0, 0, 5.25) normal (0, 0, 1) x (1, 0, 0)
  circle A0 centre (0, 0) radius 4
  dimension "d20" = 8
extrude "Extrusion5" add sketch "Esquisse6" along normal blind 1.5
thread "Filetage1" size "M6x1" class "6g" standard "ANSI Metric M Profile" full length
sketch "Esquisse7" plane through (0, 0, 6.75) normal (0, 0, 1) x (1, 0, 0)
  point P0 (0, 0)
  point P1 (0, 0)
hole "Perçage1" at (0, 0, 6.75) direction (0, 0, -1) diameter 3 end through all counterbore diameter 5 counterbore depth 11
ref_plane "Plan de construction1" through (0, 0, 7.25) normal (0, 0, 1) x (1, 0, 0)
sketch "Esquisse8" plane through (0, 0, 7.25) normal (0, 0, 1) x (1, 0, 0)
  circle A0 centre (0, 0) radius 1.5 projected
  ellipse E0 centre (0, 0) end of major axis (-7, 0) minor radius 6
  dimension "d33" = 6
  dimension "d34" = 7
extrude "Extrusion6" add sketch "Esquisse8" along normal blind 1.5 separate body contours A0 | E0
sketch "Esquisse9" plane through (0, 0, 7.25) normal (0, 0, -1) x (-1, 0, 0)
  circle A0 centre (0, 0) radius 2.45
  dimension "d37" = 4.9
extrude "Extrusion7" add sketch "Esquisse9" along normal blind 3 bodies 2
sketch "Esquisse10" plane through (0, 0, 8.75) normal (0, 0, 1) x (1, 0, 0)
  point P0 (0, 0)
  point P1 (0, 0)
hole "Perçage2" at (0, 0, 8.75) direction (0, 0, -1) diameter 5 end through all bodies 2
fillet "Congé3" radius 0.5 3 edges at (0, 2.5, 8.75) (7, 0, 8.75) (7, 0, 7.25)
equation "\"d15\" = d14"
equation "\"d12\" = d10"
equation "\"d10\" = 1.75"
properties part number "Clip pneumatique" material "----------"
